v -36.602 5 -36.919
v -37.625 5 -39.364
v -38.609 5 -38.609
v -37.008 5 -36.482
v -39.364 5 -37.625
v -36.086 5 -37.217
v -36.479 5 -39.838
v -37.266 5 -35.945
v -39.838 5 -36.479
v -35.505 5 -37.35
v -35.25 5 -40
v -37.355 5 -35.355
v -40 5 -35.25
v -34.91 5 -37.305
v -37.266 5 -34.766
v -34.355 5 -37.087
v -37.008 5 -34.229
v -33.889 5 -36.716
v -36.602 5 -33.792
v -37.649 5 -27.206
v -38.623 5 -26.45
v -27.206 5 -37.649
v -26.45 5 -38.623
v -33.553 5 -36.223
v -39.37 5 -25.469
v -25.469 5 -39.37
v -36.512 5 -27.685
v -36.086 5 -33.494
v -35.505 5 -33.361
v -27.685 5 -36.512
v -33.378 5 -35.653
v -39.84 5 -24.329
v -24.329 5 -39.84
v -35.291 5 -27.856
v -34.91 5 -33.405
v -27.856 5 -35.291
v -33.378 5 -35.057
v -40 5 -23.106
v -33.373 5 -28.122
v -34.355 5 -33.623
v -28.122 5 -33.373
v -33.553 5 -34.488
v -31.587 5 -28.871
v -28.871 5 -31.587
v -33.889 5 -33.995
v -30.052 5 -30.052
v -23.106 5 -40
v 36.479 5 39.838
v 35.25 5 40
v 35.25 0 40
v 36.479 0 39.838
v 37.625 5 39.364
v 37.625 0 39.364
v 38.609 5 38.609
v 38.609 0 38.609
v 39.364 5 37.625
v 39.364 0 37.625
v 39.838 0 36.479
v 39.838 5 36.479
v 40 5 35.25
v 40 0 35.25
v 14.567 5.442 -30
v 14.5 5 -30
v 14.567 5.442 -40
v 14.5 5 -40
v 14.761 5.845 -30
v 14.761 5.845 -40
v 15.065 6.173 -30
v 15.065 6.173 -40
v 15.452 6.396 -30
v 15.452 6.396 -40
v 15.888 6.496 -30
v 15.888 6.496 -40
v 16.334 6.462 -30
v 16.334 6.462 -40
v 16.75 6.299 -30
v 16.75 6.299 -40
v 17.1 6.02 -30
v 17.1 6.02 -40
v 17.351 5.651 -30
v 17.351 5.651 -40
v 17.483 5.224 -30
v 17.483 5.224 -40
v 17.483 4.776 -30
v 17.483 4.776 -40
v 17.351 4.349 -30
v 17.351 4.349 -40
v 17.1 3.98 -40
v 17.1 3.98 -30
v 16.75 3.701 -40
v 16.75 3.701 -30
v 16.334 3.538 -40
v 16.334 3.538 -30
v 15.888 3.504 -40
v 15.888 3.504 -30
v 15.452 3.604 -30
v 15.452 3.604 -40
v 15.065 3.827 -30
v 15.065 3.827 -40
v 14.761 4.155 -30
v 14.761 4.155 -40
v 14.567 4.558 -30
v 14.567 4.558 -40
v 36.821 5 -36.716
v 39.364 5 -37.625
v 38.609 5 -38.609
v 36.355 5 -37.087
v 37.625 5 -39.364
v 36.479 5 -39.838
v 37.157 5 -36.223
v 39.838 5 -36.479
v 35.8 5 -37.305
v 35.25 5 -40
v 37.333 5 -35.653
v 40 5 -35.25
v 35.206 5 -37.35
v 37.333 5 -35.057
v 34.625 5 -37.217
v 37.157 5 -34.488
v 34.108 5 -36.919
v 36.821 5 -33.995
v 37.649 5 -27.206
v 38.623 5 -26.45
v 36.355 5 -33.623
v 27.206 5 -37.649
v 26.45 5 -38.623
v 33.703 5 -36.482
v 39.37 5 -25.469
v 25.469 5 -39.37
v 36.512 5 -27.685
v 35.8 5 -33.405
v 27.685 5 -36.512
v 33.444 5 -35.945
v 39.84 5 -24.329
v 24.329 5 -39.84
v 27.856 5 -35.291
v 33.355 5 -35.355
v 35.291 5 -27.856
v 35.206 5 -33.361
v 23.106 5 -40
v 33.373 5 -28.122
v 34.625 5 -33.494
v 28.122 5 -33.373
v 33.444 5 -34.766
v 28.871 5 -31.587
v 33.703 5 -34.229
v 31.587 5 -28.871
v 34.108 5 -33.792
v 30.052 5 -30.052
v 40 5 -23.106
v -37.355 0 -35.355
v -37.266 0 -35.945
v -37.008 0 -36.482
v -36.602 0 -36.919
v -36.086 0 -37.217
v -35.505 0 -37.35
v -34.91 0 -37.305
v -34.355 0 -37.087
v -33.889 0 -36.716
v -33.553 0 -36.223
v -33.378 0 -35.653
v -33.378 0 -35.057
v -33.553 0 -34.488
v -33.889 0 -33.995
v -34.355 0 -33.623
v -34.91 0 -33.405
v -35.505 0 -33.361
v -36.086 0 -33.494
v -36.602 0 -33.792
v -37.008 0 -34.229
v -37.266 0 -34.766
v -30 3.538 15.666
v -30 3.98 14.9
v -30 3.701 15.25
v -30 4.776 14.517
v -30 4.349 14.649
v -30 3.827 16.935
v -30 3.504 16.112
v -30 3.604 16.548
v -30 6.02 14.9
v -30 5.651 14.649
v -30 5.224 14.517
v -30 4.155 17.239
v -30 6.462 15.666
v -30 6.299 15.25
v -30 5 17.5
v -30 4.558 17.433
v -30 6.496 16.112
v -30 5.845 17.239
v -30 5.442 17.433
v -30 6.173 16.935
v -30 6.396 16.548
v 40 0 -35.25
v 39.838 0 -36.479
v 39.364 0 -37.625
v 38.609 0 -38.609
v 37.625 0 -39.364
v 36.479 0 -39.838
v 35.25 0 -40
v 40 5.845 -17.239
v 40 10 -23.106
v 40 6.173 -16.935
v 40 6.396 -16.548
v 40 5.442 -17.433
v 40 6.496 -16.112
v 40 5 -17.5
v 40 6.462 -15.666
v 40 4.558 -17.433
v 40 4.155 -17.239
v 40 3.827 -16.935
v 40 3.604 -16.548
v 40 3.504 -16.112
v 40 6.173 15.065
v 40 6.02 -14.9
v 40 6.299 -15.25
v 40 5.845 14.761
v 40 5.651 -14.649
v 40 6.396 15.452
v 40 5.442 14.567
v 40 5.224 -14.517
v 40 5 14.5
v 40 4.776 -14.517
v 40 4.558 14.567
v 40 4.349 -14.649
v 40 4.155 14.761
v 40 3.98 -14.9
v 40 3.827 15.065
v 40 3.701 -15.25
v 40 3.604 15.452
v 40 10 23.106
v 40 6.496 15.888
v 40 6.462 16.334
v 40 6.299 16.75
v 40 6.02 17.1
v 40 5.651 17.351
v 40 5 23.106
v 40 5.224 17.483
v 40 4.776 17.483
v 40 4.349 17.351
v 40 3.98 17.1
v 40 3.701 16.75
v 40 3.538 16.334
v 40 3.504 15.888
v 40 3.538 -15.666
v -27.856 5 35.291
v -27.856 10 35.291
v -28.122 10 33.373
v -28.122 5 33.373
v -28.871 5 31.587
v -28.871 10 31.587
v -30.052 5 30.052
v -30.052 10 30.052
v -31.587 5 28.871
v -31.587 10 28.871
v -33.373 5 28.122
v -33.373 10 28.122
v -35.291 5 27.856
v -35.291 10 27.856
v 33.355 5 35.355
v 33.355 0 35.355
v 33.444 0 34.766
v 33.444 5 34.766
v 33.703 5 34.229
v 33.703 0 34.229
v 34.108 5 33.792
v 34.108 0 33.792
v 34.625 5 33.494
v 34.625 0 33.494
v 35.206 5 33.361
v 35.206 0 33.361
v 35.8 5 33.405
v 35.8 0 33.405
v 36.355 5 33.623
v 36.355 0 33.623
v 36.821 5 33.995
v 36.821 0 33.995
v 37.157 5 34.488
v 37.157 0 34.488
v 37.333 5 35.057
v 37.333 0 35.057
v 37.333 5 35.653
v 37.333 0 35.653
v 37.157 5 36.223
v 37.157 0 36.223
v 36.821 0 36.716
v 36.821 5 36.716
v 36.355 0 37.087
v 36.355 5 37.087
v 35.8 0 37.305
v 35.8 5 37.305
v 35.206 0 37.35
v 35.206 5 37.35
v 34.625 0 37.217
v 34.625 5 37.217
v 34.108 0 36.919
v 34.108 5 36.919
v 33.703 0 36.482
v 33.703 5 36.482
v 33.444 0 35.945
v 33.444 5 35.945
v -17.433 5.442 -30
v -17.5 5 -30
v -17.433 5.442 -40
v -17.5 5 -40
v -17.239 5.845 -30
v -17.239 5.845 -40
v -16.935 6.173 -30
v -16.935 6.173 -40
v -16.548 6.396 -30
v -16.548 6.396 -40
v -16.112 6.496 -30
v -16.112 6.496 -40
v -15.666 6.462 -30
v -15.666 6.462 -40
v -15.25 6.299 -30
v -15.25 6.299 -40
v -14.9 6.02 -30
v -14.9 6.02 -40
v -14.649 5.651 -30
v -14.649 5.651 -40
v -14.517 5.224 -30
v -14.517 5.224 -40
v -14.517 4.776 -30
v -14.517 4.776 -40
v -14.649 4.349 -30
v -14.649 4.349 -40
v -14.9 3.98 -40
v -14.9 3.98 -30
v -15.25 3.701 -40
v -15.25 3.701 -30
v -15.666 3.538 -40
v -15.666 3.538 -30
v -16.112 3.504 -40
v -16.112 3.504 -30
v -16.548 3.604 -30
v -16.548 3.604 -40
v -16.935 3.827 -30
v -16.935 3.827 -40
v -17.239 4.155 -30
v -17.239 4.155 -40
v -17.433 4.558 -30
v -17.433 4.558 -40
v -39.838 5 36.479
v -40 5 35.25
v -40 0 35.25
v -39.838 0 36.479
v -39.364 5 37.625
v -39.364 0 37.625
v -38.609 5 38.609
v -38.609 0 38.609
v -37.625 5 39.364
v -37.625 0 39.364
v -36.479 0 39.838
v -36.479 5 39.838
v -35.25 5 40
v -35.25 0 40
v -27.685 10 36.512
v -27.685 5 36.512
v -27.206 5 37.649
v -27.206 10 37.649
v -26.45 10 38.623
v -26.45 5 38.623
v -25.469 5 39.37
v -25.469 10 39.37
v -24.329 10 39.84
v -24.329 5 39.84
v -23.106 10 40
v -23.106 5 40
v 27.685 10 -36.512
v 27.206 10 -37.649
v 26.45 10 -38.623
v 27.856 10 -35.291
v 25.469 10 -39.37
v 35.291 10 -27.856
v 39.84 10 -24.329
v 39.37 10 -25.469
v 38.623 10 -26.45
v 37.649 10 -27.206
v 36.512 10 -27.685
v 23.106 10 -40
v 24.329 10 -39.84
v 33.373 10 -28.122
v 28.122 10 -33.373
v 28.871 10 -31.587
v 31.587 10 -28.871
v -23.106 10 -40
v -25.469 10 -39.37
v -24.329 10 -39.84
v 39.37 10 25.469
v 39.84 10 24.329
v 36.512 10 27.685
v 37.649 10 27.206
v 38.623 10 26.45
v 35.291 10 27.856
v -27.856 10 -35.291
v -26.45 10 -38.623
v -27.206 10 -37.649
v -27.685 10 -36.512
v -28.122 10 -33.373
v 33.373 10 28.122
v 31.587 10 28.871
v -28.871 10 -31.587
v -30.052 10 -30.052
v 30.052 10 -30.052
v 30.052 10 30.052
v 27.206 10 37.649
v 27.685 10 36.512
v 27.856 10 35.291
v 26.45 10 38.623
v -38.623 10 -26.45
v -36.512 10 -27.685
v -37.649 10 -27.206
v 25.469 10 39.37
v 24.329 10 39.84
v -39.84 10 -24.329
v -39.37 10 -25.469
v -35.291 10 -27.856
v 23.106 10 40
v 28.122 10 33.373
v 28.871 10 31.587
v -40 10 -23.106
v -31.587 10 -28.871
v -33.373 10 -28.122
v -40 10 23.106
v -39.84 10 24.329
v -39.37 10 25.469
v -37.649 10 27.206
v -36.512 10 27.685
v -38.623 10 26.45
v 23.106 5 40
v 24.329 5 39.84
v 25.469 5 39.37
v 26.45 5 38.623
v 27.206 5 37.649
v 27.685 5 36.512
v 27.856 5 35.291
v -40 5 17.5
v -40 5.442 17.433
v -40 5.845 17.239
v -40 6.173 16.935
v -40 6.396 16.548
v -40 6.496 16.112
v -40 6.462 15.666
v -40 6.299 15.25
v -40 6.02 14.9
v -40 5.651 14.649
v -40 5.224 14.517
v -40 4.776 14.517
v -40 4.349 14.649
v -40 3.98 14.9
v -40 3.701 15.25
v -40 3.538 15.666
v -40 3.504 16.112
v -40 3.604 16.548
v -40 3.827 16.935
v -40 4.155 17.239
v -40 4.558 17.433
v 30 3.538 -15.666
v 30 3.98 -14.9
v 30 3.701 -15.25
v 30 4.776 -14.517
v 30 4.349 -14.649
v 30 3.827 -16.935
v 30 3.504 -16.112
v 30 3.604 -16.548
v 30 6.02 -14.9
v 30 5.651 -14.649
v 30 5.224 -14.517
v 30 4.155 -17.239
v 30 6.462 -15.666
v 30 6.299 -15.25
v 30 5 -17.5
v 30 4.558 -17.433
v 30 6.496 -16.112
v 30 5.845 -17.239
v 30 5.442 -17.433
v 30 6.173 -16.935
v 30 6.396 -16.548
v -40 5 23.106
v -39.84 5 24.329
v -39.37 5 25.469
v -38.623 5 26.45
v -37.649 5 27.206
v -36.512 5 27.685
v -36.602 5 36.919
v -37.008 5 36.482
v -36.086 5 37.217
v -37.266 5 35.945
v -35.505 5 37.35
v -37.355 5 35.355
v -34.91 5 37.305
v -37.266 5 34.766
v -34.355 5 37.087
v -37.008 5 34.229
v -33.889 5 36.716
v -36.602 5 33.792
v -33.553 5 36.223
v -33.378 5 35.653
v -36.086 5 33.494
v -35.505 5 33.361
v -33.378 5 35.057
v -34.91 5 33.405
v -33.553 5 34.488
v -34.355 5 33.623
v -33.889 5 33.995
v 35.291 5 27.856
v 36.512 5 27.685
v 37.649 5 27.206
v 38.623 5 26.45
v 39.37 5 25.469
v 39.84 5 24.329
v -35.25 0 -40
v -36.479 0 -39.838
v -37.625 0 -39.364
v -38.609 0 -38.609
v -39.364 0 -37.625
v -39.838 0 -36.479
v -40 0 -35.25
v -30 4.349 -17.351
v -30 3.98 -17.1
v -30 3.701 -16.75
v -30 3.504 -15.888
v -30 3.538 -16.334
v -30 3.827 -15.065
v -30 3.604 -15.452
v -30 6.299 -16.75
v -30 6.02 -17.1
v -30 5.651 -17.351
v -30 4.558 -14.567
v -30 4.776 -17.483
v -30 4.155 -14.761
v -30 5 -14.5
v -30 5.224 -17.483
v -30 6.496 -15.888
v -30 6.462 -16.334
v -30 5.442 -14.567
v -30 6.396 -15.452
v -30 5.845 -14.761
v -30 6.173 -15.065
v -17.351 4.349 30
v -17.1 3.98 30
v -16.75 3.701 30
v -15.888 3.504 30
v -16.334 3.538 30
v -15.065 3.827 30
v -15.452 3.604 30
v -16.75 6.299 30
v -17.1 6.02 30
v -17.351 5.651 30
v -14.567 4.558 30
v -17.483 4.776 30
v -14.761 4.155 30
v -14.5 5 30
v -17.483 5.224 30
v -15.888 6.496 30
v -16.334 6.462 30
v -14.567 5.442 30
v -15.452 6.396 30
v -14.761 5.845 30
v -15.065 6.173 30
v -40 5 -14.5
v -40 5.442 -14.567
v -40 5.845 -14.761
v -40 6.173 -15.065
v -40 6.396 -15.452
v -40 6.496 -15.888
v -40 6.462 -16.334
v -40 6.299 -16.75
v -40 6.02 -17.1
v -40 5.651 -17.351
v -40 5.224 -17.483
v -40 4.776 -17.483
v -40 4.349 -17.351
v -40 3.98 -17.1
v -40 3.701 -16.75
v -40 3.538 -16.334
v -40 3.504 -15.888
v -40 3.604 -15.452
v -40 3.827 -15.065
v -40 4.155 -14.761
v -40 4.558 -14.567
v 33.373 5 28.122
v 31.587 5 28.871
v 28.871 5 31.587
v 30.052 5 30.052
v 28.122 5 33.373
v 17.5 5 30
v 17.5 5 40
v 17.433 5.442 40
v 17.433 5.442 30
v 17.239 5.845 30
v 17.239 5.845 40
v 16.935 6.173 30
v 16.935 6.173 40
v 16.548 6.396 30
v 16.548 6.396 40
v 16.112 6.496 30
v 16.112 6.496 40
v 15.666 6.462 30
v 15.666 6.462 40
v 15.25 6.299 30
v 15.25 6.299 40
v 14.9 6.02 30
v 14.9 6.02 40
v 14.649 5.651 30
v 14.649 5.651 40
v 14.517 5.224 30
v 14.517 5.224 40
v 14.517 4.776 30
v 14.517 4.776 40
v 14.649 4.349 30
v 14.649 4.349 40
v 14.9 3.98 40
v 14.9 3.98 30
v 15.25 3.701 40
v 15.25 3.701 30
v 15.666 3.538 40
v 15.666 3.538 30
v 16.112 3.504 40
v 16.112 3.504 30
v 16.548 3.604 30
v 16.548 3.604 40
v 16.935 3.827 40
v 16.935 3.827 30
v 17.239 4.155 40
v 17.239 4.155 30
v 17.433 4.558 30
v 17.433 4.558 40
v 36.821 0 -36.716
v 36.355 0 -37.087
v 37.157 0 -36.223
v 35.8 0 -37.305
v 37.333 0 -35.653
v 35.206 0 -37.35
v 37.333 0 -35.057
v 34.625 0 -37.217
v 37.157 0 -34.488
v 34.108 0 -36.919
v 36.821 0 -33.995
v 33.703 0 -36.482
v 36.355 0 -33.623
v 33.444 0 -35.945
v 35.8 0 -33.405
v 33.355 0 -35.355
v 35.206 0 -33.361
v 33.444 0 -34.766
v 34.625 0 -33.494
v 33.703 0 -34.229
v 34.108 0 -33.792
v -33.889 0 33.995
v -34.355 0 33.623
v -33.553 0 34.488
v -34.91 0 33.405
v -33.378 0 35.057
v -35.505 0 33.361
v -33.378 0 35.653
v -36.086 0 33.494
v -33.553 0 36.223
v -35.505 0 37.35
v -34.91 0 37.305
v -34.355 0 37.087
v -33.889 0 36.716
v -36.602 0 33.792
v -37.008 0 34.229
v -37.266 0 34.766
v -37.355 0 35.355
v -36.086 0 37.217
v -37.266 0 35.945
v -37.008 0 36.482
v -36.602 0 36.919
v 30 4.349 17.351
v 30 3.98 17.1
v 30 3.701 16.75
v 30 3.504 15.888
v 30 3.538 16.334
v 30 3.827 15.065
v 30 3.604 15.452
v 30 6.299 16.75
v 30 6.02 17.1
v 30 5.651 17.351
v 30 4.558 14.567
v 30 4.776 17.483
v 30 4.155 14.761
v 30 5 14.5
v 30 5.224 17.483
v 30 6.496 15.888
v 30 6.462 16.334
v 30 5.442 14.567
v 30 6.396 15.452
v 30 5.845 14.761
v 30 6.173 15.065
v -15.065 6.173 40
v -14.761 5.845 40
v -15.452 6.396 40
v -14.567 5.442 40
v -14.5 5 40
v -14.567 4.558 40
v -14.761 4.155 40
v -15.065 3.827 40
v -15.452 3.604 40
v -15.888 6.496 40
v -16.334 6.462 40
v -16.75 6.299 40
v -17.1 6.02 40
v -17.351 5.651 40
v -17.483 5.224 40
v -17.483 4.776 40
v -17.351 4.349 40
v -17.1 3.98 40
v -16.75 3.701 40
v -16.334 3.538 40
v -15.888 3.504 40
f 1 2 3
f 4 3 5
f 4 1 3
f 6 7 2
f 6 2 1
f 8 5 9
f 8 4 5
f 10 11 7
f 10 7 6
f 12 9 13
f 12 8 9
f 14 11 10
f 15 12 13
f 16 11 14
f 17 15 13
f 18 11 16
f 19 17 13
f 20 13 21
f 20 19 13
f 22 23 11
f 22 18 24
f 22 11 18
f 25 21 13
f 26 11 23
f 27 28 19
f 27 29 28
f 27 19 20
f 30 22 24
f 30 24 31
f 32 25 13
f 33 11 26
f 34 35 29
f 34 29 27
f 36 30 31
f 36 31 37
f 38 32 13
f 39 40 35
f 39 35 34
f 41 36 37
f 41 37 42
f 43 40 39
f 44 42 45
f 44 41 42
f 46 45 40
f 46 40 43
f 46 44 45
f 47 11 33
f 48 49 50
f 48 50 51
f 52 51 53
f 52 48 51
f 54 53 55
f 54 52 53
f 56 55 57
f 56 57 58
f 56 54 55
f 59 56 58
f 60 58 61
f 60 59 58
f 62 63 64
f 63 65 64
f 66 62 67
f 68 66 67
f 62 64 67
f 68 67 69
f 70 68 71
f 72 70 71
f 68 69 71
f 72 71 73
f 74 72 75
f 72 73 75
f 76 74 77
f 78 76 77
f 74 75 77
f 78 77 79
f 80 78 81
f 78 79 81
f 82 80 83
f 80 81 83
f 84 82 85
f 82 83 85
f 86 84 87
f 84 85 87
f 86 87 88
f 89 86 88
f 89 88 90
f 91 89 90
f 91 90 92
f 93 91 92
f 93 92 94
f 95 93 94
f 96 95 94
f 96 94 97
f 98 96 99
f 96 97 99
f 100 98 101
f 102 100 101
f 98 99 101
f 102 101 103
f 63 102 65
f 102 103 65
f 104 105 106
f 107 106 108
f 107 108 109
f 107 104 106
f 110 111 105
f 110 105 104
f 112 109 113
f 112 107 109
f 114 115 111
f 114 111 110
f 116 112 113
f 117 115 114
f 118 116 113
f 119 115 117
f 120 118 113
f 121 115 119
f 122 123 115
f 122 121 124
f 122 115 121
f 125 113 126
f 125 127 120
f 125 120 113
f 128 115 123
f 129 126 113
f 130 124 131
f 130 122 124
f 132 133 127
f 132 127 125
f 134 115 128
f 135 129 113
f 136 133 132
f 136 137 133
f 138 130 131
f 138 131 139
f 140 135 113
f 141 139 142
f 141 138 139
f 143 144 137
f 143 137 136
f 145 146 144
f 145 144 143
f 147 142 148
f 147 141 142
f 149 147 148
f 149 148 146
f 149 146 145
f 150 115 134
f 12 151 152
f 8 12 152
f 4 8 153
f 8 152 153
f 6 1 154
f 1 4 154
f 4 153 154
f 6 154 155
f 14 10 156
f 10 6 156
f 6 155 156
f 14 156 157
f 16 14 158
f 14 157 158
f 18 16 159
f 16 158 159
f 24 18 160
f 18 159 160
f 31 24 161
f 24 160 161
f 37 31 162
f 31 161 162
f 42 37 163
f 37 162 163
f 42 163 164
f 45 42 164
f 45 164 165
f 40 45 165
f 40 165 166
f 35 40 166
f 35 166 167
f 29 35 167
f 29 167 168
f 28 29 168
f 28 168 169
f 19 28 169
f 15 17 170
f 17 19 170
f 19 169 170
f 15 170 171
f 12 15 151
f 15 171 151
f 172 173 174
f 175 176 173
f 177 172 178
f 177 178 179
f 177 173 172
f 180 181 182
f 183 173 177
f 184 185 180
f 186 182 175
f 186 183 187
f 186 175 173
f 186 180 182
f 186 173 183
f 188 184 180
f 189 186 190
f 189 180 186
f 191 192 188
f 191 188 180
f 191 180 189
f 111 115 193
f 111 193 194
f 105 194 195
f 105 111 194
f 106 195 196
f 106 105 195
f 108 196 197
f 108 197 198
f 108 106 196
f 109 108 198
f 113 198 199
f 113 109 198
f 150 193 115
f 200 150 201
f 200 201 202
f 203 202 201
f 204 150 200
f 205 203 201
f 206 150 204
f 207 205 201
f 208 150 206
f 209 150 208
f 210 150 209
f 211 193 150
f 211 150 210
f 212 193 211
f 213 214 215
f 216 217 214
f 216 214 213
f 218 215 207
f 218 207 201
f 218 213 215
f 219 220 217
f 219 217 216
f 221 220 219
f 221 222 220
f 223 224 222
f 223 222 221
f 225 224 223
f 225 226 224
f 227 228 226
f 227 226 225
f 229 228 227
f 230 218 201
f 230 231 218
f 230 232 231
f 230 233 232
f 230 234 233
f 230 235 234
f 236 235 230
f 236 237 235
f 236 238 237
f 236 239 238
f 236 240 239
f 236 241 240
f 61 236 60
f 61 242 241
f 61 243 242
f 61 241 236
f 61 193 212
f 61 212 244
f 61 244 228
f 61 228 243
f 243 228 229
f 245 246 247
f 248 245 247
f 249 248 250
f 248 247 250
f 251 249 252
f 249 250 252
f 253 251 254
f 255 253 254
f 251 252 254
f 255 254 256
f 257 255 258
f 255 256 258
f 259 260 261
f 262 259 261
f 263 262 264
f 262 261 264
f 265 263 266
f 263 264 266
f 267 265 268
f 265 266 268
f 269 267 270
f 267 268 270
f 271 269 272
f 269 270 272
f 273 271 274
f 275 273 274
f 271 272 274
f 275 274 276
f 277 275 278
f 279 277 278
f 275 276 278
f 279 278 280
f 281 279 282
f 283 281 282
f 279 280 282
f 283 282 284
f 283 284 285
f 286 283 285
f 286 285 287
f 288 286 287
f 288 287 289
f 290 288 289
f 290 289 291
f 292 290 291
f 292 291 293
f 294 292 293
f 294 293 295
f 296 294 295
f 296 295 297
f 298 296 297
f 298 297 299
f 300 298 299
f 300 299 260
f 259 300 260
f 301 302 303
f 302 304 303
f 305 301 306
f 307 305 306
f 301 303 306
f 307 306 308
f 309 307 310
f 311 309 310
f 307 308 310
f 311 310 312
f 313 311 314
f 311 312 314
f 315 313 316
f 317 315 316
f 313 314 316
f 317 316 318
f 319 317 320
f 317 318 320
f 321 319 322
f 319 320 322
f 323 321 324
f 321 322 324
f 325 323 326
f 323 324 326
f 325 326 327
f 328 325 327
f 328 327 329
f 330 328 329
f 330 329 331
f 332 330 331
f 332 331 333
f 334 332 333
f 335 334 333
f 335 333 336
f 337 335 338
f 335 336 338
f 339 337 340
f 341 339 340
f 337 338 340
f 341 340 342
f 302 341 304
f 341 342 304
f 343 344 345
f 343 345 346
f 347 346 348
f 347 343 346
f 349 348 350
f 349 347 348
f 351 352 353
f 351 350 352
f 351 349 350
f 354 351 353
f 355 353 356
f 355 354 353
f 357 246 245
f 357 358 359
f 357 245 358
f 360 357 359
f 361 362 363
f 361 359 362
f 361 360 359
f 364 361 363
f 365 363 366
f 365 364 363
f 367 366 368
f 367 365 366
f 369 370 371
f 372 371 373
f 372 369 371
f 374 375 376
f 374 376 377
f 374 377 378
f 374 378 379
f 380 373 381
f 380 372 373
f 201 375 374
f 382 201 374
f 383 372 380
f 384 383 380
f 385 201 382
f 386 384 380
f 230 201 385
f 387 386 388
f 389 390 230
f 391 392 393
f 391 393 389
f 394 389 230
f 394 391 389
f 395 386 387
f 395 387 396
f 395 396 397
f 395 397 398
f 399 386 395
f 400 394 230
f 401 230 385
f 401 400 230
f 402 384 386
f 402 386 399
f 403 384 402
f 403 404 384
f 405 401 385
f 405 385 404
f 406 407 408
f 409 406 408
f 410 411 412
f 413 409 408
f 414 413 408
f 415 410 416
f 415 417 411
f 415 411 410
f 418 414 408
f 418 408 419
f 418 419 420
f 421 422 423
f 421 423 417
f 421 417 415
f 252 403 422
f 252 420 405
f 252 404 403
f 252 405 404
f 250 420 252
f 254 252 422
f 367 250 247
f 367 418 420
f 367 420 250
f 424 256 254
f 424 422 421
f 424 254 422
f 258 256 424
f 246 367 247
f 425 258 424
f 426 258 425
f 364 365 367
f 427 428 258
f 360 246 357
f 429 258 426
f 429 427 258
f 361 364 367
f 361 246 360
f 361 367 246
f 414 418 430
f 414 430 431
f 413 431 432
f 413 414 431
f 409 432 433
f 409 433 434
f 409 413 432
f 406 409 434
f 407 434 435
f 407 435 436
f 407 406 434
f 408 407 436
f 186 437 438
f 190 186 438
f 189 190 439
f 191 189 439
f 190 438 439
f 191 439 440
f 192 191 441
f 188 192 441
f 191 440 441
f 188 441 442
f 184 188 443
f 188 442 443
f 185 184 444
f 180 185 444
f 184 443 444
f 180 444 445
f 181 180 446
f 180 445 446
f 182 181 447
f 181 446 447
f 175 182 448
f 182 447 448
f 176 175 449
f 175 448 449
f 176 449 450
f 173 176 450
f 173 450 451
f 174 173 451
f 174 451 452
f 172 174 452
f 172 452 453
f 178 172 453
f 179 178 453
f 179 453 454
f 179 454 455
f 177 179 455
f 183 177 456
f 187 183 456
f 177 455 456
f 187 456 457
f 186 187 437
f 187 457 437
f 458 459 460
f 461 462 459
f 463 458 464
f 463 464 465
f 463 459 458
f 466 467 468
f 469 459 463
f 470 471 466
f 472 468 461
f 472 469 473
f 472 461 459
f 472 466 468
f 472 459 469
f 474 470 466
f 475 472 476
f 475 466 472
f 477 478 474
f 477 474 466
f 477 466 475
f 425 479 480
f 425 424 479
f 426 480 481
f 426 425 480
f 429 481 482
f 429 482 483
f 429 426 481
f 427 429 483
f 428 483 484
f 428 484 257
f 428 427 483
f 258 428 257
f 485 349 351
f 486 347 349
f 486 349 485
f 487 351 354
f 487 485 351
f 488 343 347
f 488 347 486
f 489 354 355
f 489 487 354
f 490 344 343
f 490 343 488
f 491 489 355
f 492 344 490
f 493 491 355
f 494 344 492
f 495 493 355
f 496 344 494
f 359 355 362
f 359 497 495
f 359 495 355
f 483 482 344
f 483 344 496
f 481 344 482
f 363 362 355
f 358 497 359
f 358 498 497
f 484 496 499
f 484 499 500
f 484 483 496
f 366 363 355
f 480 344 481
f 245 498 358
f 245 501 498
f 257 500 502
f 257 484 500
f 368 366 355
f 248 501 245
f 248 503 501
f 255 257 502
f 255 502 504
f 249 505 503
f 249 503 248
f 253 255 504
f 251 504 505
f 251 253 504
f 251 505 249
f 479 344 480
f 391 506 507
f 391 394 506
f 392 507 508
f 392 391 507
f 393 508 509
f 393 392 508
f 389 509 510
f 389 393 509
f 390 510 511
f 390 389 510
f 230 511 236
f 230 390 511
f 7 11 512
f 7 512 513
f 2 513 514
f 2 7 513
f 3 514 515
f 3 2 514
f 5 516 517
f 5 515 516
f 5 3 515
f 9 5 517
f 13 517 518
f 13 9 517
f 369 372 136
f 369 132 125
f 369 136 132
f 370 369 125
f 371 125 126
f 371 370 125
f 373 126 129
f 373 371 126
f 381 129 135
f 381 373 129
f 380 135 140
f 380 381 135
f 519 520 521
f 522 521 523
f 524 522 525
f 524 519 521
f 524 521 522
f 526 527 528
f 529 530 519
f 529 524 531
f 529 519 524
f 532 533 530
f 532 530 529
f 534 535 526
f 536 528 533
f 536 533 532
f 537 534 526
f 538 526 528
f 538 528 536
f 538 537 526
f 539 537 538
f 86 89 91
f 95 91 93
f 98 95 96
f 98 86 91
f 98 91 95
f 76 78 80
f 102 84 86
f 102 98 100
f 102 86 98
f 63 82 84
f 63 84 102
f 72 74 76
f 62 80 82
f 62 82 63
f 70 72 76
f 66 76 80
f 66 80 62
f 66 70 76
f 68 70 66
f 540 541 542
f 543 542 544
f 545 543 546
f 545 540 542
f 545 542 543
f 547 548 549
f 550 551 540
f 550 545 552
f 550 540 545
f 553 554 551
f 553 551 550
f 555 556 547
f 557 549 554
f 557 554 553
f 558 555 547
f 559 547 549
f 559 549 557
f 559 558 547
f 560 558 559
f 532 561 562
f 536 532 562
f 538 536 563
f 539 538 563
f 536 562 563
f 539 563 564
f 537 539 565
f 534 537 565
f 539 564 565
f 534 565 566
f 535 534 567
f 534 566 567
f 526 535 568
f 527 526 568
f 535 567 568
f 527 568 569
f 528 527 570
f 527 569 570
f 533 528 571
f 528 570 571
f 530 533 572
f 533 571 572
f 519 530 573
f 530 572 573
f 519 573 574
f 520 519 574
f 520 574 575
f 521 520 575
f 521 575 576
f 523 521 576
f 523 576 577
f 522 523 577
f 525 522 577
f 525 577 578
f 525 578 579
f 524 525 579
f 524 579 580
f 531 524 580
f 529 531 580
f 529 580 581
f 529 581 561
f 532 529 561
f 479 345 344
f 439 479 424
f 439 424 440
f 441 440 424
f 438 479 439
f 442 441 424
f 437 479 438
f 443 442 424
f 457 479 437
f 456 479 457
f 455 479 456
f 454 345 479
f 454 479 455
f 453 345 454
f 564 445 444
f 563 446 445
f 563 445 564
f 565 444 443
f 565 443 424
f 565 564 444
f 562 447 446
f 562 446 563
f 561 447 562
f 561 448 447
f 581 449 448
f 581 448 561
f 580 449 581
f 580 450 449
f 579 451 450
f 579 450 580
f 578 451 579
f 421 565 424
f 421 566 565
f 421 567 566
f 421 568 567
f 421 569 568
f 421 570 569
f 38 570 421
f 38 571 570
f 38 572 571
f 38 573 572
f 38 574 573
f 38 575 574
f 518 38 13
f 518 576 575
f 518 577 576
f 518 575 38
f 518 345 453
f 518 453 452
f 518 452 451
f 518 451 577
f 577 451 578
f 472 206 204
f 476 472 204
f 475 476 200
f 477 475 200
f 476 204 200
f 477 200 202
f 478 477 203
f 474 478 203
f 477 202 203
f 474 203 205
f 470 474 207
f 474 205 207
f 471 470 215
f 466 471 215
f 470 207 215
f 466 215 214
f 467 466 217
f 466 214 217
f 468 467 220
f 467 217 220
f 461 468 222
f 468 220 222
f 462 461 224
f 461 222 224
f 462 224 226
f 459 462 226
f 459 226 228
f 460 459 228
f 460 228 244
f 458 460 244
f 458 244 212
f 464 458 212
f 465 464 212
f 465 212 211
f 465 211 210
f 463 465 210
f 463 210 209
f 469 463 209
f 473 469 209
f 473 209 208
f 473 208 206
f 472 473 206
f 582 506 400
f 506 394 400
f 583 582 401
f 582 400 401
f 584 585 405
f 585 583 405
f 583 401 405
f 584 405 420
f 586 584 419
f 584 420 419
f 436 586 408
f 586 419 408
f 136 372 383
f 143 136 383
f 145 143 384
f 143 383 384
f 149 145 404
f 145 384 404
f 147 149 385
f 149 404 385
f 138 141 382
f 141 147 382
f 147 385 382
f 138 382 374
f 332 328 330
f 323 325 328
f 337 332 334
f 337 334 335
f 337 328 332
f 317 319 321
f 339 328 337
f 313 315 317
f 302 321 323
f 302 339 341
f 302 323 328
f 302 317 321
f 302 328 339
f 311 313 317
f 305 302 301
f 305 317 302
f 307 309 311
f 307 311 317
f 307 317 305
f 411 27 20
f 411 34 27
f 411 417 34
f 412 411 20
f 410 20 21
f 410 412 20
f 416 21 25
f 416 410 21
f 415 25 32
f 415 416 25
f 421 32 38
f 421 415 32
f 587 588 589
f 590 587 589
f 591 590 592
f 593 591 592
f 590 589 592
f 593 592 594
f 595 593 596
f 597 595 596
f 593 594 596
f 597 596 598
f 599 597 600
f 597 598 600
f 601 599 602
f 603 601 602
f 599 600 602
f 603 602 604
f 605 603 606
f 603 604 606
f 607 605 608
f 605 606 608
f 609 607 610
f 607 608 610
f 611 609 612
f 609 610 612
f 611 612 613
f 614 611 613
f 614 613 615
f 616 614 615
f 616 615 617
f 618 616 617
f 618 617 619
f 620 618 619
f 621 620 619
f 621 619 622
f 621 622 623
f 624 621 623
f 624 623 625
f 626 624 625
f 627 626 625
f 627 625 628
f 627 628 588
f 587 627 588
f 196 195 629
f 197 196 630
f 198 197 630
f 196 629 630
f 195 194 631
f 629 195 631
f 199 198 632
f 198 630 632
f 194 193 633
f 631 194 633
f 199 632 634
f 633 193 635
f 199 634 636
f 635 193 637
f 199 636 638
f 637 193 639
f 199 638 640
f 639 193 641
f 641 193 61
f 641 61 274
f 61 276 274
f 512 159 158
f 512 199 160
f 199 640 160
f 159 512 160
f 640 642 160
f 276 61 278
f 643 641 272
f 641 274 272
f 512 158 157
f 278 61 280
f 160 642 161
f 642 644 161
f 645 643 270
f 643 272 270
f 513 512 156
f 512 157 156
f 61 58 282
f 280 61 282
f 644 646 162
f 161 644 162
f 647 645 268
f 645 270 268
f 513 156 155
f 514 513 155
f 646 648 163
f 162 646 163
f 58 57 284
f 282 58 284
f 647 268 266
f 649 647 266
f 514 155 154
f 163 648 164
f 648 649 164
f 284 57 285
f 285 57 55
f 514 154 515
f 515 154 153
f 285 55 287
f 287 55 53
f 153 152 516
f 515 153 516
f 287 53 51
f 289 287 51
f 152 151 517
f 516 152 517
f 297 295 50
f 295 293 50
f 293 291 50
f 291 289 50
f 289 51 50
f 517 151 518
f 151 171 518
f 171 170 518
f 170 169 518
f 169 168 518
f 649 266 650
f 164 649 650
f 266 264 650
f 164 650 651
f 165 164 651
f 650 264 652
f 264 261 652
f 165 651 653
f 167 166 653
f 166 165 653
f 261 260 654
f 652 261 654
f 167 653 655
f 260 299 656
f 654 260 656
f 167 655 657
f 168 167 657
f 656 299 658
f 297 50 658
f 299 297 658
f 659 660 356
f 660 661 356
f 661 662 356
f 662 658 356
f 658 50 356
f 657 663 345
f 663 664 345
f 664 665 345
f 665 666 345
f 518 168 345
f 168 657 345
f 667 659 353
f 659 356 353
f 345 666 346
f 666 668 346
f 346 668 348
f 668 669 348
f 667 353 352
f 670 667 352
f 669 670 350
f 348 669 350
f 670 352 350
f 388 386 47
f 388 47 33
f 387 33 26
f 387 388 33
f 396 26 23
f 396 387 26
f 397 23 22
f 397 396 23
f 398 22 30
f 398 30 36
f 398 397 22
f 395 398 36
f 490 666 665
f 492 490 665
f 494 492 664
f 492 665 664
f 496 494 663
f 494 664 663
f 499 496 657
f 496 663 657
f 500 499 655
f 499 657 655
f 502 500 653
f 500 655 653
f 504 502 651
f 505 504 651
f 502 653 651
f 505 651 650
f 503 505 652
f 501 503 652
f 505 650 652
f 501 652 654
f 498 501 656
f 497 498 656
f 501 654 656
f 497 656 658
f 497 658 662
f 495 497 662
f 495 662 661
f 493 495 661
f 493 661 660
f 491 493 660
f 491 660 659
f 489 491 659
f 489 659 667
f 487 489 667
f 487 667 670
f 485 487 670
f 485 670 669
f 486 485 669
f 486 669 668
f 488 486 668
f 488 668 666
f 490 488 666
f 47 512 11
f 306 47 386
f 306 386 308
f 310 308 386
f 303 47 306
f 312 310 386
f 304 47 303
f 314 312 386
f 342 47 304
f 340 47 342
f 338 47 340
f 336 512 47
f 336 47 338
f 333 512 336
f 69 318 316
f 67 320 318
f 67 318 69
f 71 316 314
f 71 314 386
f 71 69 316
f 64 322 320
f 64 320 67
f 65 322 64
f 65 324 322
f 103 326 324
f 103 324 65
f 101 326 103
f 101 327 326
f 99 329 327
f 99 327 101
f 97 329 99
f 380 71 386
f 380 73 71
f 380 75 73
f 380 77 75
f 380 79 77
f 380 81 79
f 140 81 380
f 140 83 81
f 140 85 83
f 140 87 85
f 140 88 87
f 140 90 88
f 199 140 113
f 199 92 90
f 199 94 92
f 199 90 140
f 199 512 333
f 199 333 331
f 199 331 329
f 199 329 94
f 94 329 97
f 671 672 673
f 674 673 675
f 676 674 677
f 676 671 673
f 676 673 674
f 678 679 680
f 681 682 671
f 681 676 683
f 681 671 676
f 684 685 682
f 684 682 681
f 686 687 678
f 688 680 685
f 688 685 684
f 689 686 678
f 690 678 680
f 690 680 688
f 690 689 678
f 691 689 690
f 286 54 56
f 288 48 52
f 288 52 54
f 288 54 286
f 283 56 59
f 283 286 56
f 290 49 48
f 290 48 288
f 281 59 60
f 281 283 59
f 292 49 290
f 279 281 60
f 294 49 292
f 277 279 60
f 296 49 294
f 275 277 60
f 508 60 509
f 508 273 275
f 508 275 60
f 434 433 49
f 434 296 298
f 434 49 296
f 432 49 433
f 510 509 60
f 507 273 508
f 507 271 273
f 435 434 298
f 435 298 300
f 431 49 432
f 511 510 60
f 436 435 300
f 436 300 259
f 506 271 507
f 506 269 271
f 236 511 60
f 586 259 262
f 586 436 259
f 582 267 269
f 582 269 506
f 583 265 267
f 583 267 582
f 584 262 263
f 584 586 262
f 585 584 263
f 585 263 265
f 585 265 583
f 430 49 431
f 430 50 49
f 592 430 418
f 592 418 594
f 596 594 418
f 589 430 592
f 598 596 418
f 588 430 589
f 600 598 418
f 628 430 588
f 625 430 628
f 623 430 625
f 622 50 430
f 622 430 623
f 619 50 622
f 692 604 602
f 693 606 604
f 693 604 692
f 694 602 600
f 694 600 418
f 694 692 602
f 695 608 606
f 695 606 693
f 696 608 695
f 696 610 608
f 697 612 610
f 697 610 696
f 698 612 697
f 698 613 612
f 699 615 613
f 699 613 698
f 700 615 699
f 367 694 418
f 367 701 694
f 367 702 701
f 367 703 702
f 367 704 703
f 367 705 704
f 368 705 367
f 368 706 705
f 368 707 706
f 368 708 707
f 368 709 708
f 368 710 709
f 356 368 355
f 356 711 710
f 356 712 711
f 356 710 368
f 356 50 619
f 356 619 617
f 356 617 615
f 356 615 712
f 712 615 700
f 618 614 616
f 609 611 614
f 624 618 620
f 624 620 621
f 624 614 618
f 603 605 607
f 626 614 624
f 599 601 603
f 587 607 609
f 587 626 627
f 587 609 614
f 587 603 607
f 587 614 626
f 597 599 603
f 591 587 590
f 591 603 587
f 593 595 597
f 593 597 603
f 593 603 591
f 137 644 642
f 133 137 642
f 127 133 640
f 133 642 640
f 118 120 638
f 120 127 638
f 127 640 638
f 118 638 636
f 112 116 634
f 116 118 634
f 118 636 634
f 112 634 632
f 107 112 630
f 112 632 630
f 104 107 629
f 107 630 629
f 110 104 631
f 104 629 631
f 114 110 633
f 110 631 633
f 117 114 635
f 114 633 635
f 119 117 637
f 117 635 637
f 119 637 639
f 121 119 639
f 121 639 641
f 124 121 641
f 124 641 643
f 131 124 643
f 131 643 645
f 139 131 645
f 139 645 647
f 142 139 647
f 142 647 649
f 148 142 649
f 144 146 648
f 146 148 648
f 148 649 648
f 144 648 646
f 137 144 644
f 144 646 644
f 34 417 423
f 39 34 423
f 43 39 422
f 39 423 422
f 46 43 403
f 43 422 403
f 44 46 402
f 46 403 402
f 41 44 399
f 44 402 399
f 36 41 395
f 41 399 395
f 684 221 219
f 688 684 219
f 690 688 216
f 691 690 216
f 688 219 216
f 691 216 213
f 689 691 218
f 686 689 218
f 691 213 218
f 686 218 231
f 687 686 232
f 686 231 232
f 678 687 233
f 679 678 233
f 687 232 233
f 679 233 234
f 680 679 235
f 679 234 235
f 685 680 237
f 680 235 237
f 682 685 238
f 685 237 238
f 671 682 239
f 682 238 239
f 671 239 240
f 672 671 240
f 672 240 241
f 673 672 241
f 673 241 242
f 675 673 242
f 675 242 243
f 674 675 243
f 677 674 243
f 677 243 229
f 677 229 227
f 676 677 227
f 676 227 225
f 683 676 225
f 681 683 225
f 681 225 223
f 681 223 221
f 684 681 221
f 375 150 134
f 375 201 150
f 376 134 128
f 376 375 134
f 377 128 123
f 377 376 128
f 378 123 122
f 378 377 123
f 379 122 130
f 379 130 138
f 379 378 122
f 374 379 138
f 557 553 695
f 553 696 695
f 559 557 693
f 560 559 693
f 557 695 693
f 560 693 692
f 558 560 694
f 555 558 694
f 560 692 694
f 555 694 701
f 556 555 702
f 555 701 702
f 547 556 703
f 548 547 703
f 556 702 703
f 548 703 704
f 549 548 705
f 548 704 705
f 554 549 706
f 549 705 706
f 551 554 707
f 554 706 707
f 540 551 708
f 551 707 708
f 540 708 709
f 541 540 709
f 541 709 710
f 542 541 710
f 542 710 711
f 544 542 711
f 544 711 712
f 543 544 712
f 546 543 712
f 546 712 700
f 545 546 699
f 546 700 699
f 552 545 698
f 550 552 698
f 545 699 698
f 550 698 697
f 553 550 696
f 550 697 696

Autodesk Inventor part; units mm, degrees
ref_plane "YZ Plane" through (0, 0, 0) normal (1, 0, 0) x (0, 1, 0)
ref_plane "XZ Plane" through (0, 0, 0) normal (0, 1, 0) x (-1, 0, 0)
ref_plane "XY Plane" through (0, 0, 0) normal (0, 0, 1) x (1, 0, 0)
sketch "Эскиз1" plane through (0, 0, 0) normal (0, 1, 0) x (-1, 0, 0)
  circle A0 centre (35.3553, 35.3553) radius 2
  circle A1 centre (-35.3553, 35.3553) radius 2
  circle A2 centre (-35.3553, -35.3553) radius 2
  circle A3 centre (35.3553, -35.3553) radius 2
  line L0 (-40, 40) -> (40, 40)
  line L1 (40, 40) -> (40, -40)
  line L2 (40, -40) -> (-40, -40)
  line L3 (-40, -40) -> (-40, 40)
  line L4 (-40, 40) -> (40, -40) construction
  line L5 (40, 40) -> (-40, -40) construction
  line L6 (35.3553, 35.3553) -> (0, 0) construction
  line L7 (0, 0) -> (0, 4.1405) construction
  dimension "d0" = 4
  dimension "d1" = 50
  dimension "d4" = 360
  dimension "d6" = 80
  dimension "d7" = 80
  dimension "d17" = 45
extrude "Выдавливание1" add sketch "Эскиз1" along normal blind 10
sketch "Эскиз2" plane through (0, 10, 0) normal (0, 1, 0) x (1, 0, 0)
  circle A0 centre (-35.3553, -35.3553) radius 2 projected
  circle A1 centre (-35.3553, -35.3553) radius 7.5
  point P0 (0, 0)
  dimension "d10" = 15
extrude "Выдавливание2" cut sketch "Эскиз2" against normal blind 5
pattern_circular "Круговой массив1" count 4 over 360 about axis through (0, -10, 0) along (0, 1, 0) of "Выдавливание2"
fillet "Сопряжение1" radius 4.75 12 edges at (29.4666, 7.5, 40) (40, 7.5, 29.4666) (40, 7.5, -29.4666) (29.4666, 7.5, -40) (-29.4666, 7.5, -40) (-40, 7.5, -29.4666) (-40, 7.5, 29.4666) (-29.4666, 7.5, 40) (-40, 2.5, 40) (40, 2.5, 40) (40, 2.5, -40) (-40, 2.5, -40)
sketch "Эскиз3" plane through (-35.25, 0, 40) normal (0, 0, 1) x (1, 0, 0)
  circle A0 centre (19.25, 5) radius 1.5
  circle A1 centre (51.25, 5) radius 1.5
  line L0 (0, 0) -> (70.5, 0) projected
  line L1 (35.25, 0) -> (35.25, 5.0167)
  dimension "d18" = 3
  dimension "d19" = 3
  dimension "d20" = 5
  dimension "d21" = 16
extrude "Выдавливание3" cut sketch "Эскиз3" against normal blind 10
pattern_circular "Круговой массив2" count 4 over 360 about axis through (0, -10, 0) along (0, 1, 0) of "Выдавливание3"
sketch "Эскиз4" plane through (-35.25, 0, 40) normal (0, 0, 1) x (1, 0, 0)
  circle A0 centre (51.25, 5) radius 1.5 projected
  circle A1 centre (19.25, 5) radius 1.5 projected
  line L0 (70.5, 5) -> (70.5, 0) projected
  line L1 (70.5, 5) -> (58.3558, 5) projected
  line L2 (58.3558, 10) -> (58.3558, 5) projected
  line L3 (12.1442, 10) -> (58.3558, 10) projected
  line L4 (12.1442, 5) -> (12.1442, 10) projected
  line L5 (12.1442, 5) -> (0, 5) projected
  line L6 (0, 0) -> (0, 5) projected
  line L7 (0, 0) -> (70.5, 0) projected
  point P0 (35.25, 0)
properties part number "KB33-046-009 - Колпак лидара"
